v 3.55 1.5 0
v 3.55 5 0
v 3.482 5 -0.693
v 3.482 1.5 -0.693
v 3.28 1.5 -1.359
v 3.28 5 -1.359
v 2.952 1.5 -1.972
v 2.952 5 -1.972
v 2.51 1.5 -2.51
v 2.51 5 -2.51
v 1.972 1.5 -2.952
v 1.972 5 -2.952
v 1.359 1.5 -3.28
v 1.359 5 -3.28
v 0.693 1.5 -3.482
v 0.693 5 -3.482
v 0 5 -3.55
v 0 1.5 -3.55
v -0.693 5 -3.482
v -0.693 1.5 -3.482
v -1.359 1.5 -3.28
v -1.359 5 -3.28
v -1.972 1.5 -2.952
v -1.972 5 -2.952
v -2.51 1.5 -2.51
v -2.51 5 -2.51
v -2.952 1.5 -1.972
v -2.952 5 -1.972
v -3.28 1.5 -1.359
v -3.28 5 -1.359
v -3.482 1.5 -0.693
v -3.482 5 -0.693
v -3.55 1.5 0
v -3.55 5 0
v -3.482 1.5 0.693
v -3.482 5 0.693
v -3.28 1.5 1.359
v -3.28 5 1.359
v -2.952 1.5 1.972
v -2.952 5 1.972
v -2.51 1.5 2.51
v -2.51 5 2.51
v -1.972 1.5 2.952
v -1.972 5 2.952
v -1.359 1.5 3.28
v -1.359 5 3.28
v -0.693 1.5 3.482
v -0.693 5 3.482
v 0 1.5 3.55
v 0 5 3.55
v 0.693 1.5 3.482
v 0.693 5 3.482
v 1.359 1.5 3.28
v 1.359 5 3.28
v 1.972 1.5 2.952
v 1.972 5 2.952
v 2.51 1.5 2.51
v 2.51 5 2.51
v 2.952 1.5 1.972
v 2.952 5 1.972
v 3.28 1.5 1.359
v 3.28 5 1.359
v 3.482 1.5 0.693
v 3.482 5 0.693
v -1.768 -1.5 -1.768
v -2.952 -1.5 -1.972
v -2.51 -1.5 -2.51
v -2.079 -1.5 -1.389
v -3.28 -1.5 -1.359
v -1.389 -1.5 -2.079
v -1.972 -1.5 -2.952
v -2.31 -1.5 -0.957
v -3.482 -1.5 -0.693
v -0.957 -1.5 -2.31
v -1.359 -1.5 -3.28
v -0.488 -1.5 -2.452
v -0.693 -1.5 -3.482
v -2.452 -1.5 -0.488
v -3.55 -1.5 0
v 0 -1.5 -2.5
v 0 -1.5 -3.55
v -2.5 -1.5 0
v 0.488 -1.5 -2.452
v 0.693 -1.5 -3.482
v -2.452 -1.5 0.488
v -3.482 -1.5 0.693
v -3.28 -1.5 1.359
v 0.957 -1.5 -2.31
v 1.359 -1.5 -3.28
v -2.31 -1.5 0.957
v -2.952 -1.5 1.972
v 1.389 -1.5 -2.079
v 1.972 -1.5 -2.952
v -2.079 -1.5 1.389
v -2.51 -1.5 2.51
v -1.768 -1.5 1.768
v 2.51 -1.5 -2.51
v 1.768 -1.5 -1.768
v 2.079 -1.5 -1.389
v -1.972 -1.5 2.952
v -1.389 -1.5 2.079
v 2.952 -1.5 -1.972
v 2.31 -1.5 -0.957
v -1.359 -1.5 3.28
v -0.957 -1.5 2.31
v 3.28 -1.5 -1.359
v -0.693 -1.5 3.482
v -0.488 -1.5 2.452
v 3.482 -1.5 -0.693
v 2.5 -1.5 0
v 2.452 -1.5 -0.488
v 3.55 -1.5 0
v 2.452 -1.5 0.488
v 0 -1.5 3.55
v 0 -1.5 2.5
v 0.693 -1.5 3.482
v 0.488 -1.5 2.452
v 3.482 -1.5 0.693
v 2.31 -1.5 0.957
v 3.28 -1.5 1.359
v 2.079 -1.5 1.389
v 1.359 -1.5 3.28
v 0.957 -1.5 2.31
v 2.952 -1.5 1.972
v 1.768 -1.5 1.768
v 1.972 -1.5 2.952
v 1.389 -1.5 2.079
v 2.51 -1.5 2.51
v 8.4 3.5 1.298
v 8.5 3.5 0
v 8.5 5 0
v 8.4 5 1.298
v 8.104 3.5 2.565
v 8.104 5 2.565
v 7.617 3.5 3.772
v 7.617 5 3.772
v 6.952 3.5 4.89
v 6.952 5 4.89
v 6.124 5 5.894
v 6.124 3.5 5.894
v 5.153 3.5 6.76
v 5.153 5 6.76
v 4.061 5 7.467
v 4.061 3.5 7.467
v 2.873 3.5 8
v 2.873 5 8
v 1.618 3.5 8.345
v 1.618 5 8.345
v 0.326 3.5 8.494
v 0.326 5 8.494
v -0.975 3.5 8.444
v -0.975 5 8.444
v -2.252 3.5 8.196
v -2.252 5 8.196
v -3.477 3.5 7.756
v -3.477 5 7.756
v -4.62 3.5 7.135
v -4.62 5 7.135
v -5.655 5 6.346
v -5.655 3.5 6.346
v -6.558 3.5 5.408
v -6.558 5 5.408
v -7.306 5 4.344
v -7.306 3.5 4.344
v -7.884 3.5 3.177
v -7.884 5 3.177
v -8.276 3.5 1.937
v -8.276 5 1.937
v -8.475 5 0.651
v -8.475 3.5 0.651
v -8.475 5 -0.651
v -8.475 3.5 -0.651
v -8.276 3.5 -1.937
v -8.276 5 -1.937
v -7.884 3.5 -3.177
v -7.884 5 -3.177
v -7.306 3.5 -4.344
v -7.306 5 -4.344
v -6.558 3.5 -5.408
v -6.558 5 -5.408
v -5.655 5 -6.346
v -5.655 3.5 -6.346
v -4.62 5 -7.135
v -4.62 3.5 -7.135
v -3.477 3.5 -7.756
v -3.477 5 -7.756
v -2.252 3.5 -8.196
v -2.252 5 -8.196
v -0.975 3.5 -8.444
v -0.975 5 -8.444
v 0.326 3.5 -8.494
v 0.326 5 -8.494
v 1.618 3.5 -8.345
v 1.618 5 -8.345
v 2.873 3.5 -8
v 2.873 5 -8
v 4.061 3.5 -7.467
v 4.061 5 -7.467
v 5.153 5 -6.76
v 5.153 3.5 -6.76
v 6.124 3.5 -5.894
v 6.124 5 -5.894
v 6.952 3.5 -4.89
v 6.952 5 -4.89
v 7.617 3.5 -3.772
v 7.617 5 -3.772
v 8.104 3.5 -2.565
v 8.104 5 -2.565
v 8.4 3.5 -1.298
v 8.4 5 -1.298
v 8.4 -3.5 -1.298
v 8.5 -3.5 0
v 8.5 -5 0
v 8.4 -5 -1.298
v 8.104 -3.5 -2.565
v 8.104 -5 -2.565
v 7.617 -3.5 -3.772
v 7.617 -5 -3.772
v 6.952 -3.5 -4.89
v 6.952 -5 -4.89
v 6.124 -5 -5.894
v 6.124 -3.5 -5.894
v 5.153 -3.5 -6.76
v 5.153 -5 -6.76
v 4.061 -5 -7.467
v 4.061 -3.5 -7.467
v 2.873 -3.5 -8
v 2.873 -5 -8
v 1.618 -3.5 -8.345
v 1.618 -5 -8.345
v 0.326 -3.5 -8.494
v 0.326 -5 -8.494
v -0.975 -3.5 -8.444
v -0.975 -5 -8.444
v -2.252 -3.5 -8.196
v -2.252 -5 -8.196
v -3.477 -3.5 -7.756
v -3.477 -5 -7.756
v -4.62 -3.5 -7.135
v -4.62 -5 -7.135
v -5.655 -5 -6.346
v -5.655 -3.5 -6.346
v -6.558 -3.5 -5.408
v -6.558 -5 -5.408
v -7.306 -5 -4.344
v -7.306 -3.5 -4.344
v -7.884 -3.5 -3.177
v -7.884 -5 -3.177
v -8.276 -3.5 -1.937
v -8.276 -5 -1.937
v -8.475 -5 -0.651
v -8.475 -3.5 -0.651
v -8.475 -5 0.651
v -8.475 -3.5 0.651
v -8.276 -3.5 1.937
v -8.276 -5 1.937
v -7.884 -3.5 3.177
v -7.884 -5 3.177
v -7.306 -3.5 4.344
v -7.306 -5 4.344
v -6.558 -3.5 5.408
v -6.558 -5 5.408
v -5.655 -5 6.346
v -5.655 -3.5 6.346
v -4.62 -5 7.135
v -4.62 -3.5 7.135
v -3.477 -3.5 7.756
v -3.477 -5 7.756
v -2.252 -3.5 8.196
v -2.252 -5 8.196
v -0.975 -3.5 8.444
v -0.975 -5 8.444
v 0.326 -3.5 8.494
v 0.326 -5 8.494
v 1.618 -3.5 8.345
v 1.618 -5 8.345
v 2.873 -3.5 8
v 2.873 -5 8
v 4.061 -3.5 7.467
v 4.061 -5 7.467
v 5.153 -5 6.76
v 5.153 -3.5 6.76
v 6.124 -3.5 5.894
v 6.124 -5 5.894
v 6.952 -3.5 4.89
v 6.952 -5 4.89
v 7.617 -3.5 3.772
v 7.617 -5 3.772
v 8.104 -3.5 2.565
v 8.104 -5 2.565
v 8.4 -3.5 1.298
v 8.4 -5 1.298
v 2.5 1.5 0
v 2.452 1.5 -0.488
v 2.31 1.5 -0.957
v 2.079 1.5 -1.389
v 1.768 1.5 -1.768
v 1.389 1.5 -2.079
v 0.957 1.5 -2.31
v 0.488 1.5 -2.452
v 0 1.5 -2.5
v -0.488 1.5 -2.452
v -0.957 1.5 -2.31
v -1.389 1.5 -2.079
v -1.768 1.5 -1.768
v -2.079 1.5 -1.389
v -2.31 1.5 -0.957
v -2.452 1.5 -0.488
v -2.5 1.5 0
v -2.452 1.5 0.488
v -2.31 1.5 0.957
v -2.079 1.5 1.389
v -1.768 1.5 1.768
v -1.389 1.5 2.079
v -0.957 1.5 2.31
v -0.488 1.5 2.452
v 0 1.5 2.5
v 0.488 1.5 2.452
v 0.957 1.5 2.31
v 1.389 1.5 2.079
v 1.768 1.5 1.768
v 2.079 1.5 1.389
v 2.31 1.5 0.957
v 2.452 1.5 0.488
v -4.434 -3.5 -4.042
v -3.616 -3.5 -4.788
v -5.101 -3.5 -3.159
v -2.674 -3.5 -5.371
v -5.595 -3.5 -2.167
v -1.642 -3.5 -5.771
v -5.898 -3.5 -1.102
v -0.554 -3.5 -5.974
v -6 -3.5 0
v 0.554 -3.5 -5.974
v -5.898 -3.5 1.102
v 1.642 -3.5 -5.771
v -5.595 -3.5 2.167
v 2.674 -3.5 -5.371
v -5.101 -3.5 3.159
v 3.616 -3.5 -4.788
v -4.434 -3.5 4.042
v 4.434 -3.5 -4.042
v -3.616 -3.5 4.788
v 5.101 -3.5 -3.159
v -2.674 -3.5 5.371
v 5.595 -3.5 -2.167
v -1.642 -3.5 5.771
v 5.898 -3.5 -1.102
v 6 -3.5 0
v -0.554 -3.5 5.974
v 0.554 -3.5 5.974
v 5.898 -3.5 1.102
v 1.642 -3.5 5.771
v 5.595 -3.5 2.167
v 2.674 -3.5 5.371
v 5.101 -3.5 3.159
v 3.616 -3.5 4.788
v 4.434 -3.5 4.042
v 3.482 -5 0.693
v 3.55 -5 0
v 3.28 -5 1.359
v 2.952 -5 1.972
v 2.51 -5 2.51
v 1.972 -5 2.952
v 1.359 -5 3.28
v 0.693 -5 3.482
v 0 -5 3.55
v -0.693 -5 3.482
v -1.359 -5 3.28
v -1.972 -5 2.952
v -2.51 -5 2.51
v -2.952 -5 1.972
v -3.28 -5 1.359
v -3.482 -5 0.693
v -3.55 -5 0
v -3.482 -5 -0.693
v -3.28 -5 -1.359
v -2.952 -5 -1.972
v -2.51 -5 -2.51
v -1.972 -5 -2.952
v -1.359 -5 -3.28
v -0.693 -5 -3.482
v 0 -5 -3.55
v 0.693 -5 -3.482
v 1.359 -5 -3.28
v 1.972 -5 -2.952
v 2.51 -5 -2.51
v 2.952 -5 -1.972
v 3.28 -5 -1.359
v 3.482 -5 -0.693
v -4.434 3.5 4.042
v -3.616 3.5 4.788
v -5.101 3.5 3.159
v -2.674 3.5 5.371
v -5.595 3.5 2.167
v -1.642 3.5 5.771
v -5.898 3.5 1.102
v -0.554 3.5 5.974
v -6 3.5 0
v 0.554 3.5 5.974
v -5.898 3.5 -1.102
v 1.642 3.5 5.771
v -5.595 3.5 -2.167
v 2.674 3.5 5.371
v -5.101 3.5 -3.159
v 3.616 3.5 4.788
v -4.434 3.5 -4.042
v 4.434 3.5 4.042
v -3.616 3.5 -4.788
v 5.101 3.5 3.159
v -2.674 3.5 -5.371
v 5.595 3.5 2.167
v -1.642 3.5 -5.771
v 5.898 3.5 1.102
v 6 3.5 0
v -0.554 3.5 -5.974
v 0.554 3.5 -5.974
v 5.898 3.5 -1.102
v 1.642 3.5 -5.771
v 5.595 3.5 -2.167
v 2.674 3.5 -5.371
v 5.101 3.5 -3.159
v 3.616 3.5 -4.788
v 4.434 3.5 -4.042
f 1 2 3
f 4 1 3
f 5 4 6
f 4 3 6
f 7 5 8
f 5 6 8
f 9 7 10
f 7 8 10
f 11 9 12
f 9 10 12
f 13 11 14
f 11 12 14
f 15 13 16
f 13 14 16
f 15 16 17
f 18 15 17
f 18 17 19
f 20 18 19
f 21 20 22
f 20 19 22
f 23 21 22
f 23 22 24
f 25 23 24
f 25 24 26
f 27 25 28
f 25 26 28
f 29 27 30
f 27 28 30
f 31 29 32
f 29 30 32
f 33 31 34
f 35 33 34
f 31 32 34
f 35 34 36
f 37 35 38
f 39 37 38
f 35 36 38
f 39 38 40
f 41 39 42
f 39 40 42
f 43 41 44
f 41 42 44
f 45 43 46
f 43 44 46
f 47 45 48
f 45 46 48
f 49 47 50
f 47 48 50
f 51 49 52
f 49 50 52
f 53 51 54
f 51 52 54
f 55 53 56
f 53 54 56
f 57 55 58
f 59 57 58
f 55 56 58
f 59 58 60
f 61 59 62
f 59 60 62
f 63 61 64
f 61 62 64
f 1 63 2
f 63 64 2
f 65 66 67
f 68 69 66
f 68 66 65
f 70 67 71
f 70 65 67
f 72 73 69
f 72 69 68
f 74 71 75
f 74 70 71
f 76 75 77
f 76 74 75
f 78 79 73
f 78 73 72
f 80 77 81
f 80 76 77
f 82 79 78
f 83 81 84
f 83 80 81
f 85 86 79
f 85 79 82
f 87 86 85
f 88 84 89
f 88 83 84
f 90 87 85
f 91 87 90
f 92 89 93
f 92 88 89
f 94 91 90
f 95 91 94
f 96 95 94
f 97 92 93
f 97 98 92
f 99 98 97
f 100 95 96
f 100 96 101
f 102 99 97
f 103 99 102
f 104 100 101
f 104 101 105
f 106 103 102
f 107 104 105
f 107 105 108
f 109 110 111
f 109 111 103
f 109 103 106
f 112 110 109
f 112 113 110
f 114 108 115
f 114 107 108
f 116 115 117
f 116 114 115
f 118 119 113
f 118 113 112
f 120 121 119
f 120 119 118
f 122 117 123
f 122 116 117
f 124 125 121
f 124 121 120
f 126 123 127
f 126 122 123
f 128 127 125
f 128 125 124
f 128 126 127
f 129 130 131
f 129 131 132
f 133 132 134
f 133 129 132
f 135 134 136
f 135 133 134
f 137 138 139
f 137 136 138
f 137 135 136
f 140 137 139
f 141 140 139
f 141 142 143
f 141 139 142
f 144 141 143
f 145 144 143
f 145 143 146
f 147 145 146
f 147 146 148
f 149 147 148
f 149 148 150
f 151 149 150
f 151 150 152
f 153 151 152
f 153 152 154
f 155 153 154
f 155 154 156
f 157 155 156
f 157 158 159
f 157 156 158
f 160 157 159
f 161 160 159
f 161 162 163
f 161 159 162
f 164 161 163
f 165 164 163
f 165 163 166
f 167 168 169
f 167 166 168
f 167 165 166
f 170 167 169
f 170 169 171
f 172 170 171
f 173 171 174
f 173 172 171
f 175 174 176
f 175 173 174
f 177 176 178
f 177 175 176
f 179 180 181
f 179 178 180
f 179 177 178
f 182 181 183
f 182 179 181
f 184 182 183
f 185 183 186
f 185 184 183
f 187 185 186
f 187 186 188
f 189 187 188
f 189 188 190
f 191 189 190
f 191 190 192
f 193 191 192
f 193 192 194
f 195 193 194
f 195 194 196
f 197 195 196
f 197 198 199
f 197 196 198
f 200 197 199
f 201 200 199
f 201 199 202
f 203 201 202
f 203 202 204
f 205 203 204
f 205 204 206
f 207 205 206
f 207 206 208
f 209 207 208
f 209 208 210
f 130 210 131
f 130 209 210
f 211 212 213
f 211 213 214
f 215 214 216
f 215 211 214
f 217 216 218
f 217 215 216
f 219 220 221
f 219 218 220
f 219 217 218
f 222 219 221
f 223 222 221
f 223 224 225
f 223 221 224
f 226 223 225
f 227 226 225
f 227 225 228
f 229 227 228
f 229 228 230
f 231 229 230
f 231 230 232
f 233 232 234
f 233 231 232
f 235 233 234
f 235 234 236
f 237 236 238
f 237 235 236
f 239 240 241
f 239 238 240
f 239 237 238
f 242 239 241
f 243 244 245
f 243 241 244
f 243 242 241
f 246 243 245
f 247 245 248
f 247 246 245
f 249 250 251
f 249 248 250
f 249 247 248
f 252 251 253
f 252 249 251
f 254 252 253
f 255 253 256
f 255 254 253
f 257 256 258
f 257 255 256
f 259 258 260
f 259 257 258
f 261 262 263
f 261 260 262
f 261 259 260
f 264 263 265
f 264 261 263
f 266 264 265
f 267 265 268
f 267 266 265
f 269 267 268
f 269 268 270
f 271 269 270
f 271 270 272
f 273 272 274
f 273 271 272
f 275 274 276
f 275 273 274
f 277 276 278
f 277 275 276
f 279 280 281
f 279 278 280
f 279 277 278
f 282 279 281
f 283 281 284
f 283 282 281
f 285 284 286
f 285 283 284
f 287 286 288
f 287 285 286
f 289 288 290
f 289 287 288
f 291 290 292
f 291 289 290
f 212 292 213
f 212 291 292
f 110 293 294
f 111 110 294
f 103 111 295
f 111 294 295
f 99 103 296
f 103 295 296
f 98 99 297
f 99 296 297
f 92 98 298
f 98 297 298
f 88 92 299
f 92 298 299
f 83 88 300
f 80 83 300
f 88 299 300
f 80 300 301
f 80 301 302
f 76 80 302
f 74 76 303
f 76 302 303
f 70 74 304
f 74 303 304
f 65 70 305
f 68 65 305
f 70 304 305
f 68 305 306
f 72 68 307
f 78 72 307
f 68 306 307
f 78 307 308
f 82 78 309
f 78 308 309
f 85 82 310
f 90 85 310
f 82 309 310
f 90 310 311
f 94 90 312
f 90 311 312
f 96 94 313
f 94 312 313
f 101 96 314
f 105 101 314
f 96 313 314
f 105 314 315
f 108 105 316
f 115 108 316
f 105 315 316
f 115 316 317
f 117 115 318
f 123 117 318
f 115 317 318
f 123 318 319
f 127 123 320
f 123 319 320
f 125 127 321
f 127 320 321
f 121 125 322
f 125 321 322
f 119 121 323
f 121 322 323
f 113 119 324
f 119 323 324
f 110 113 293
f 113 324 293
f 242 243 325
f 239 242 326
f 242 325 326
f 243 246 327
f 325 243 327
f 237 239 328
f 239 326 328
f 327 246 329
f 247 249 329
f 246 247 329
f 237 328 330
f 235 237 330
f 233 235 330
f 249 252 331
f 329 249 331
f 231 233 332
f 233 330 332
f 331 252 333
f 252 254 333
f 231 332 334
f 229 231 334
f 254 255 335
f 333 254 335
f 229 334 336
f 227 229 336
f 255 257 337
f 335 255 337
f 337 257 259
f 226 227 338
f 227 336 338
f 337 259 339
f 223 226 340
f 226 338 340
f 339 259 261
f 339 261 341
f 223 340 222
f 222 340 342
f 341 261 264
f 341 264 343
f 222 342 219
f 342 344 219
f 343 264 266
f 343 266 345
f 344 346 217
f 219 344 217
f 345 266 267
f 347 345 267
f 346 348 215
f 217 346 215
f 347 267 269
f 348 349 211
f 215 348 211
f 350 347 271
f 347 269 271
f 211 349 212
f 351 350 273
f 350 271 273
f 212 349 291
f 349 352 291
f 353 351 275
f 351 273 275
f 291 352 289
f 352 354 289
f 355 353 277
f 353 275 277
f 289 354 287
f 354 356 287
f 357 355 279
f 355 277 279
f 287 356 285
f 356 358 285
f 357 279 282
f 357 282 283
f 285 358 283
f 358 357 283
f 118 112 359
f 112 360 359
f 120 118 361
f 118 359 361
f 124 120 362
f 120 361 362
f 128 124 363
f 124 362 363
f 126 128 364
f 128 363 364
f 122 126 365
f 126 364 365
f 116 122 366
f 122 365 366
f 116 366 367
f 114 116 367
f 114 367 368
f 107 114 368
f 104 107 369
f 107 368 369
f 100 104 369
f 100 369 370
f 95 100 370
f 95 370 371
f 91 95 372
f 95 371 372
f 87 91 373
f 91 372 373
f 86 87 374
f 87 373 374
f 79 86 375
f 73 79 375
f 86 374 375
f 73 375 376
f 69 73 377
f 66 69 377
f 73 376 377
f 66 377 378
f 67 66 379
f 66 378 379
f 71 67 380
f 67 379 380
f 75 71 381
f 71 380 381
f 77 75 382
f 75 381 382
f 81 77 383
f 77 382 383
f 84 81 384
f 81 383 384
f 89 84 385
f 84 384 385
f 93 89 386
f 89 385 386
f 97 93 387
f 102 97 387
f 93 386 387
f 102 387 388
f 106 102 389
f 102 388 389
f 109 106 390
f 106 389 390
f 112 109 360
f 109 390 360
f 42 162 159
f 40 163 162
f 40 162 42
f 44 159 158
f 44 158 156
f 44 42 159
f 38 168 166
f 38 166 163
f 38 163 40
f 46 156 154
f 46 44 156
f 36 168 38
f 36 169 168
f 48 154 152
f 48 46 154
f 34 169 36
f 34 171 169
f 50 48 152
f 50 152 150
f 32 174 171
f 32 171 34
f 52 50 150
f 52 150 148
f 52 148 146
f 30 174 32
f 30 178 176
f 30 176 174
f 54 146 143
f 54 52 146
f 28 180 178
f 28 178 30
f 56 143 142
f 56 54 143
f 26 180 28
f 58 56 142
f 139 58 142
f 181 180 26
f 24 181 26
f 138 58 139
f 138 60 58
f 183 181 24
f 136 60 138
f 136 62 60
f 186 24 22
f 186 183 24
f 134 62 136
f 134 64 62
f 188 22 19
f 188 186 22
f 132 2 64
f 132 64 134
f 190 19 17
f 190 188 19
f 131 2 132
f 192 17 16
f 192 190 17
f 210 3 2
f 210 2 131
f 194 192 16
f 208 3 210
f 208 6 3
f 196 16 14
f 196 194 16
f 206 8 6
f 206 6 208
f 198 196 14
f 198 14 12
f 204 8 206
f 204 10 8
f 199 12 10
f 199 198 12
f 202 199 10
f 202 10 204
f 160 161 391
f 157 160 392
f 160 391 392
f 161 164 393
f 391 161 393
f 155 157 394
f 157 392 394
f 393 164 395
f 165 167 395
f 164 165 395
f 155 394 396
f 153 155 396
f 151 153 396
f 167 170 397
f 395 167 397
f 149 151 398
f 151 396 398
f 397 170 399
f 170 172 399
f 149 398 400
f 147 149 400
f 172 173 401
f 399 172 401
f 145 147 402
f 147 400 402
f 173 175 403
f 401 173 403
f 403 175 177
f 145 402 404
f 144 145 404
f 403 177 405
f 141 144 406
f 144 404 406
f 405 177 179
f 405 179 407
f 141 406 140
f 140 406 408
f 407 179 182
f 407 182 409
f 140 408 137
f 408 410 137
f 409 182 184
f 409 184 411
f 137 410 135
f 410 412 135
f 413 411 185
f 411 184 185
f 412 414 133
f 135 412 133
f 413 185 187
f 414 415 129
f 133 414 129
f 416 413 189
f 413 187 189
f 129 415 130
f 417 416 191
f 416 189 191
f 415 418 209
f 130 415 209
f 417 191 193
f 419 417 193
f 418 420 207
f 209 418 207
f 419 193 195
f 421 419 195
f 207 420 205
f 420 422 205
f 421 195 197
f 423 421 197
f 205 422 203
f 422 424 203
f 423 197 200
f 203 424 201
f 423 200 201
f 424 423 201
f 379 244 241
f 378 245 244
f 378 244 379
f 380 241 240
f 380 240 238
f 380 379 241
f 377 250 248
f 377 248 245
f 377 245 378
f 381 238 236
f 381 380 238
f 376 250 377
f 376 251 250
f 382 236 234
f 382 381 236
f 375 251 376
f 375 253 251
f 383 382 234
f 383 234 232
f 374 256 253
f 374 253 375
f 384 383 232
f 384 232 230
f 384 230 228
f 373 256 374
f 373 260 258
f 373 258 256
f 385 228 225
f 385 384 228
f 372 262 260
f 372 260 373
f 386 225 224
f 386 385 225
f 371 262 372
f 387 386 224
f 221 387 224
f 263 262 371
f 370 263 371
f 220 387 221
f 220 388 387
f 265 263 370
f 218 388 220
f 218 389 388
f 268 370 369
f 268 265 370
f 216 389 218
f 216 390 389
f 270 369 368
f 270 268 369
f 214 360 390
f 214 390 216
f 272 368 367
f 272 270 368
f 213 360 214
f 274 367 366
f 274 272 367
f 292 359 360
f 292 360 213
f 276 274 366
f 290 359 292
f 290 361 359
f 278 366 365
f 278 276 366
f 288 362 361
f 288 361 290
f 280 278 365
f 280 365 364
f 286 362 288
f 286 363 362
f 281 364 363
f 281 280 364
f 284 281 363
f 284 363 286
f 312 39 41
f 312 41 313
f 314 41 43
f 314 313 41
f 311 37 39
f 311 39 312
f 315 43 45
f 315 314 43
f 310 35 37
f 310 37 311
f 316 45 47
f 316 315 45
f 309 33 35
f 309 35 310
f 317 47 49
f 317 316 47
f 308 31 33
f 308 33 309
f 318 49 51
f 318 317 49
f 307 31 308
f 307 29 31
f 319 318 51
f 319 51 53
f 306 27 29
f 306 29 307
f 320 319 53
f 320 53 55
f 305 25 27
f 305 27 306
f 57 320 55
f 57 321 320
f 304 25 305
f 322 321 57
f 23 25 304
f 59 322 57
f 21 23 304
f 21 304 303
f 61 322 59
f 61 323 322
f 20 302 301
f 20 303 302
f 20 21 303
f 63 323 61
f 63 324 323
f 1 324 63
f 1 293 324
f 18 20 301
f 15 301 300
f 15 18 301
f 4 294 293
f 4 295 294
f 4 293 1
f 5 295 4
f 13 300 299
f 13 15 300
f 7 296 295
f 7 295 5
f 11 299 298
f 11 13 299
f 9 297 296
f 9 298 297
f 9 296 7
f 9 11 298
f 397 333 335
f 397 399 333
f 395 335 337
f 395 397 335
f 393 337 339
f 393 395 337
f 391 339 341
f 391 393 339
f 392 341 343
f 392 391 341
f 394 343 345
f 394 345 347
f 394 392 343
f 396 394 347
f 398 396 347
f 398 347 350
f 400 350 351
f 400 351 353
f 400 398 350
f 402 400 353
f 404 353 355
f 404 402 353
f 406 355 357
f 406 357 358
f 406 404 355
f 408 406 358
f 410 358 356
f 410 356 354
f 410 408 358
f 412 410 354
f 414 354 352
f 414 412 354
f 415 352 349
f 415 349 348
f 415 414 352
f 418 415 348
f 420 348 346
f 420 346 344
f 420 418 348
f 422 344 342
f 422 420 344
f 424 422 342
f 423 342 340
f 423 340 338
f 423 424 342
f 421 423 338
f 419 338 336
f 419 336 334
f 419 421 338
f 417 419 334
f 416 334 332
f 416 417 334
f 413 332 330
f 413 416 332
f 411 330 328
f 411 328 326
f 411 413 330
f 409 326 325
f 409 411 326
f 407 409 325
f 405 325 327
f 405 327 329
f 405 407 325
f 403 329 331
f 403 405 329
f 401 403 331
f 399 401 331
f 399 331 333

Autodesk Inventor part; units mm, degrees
ref_plane "YZ Plane" through (0, 0, 0) normal (1, 0, 0) x (0, 1, 0)
ref_plane "XZ Plane" through (0, 0, 0) normal (0, 1, 0) x (-1, 0, 0)
ref_plane "XY Plane" through (0, 0, 0) normal (0, 0, 1) x (1, 0, 0)
sketch "Sketch1" plane through (0, 0, 0) normal (0, 1, 0) x (-1, 0, 0)
  circle A0 centre (0, 0) radius 6
  dimension "d0" = 12
extrude "Extrusion1" add sketch "Sketch1" along normal mid plane 7
sketch "Sketch2" plane through (0, 3.5, 0) normal (0, 1, 0) x (1, 0, 0)
  circle A0 centre (0, 0) radius 8.5
  dimension "d3" = 17
extrude "Extrusion2" add sketch "Sketch2" along normal blind 1.5
sketch "Sketch3" plane through (0, -3.5, 0) normal (0, -1, 0) x (1, 0, 0)
  circle A0 centre (0, 0) radius 8.5
  dimension "d8" = 17
extrude "Extrusion3" add sketch "Sketch3" along normal blind 1.5
sketch "Sketch4" plane through (0, 5, 0) normal (0, 1, 0) x (1, 0, 0)
  circle A0 centre (0, 0) radius 2.5
  dimension "d9" = 5
extrude "Extrusion4" cut sketch "Sketch4" against normal up to next
sketch "Sketch8" plane through (0, 5, 0) normal (0, 1, 0) x (1, 0, 0)
  circle A0 centre (0, 0) radius 3.55
  dimension "d12" = 7.1
extrude "Extrusion5" cut sketch "Sketch8" against normal blind 3.5
sketch "Sketch9" plane through (0, -5, 0) normal (0, -1, 0) x (1, 0, 0)
  circle A0 centre (0, 0) radius 3.55
  dimension "d15" = 7.1
extrude "Extrusion6" cut sketch "Sketch9" against normal blind 3.5
properties part number "Катушка" material "Polypropylene"
